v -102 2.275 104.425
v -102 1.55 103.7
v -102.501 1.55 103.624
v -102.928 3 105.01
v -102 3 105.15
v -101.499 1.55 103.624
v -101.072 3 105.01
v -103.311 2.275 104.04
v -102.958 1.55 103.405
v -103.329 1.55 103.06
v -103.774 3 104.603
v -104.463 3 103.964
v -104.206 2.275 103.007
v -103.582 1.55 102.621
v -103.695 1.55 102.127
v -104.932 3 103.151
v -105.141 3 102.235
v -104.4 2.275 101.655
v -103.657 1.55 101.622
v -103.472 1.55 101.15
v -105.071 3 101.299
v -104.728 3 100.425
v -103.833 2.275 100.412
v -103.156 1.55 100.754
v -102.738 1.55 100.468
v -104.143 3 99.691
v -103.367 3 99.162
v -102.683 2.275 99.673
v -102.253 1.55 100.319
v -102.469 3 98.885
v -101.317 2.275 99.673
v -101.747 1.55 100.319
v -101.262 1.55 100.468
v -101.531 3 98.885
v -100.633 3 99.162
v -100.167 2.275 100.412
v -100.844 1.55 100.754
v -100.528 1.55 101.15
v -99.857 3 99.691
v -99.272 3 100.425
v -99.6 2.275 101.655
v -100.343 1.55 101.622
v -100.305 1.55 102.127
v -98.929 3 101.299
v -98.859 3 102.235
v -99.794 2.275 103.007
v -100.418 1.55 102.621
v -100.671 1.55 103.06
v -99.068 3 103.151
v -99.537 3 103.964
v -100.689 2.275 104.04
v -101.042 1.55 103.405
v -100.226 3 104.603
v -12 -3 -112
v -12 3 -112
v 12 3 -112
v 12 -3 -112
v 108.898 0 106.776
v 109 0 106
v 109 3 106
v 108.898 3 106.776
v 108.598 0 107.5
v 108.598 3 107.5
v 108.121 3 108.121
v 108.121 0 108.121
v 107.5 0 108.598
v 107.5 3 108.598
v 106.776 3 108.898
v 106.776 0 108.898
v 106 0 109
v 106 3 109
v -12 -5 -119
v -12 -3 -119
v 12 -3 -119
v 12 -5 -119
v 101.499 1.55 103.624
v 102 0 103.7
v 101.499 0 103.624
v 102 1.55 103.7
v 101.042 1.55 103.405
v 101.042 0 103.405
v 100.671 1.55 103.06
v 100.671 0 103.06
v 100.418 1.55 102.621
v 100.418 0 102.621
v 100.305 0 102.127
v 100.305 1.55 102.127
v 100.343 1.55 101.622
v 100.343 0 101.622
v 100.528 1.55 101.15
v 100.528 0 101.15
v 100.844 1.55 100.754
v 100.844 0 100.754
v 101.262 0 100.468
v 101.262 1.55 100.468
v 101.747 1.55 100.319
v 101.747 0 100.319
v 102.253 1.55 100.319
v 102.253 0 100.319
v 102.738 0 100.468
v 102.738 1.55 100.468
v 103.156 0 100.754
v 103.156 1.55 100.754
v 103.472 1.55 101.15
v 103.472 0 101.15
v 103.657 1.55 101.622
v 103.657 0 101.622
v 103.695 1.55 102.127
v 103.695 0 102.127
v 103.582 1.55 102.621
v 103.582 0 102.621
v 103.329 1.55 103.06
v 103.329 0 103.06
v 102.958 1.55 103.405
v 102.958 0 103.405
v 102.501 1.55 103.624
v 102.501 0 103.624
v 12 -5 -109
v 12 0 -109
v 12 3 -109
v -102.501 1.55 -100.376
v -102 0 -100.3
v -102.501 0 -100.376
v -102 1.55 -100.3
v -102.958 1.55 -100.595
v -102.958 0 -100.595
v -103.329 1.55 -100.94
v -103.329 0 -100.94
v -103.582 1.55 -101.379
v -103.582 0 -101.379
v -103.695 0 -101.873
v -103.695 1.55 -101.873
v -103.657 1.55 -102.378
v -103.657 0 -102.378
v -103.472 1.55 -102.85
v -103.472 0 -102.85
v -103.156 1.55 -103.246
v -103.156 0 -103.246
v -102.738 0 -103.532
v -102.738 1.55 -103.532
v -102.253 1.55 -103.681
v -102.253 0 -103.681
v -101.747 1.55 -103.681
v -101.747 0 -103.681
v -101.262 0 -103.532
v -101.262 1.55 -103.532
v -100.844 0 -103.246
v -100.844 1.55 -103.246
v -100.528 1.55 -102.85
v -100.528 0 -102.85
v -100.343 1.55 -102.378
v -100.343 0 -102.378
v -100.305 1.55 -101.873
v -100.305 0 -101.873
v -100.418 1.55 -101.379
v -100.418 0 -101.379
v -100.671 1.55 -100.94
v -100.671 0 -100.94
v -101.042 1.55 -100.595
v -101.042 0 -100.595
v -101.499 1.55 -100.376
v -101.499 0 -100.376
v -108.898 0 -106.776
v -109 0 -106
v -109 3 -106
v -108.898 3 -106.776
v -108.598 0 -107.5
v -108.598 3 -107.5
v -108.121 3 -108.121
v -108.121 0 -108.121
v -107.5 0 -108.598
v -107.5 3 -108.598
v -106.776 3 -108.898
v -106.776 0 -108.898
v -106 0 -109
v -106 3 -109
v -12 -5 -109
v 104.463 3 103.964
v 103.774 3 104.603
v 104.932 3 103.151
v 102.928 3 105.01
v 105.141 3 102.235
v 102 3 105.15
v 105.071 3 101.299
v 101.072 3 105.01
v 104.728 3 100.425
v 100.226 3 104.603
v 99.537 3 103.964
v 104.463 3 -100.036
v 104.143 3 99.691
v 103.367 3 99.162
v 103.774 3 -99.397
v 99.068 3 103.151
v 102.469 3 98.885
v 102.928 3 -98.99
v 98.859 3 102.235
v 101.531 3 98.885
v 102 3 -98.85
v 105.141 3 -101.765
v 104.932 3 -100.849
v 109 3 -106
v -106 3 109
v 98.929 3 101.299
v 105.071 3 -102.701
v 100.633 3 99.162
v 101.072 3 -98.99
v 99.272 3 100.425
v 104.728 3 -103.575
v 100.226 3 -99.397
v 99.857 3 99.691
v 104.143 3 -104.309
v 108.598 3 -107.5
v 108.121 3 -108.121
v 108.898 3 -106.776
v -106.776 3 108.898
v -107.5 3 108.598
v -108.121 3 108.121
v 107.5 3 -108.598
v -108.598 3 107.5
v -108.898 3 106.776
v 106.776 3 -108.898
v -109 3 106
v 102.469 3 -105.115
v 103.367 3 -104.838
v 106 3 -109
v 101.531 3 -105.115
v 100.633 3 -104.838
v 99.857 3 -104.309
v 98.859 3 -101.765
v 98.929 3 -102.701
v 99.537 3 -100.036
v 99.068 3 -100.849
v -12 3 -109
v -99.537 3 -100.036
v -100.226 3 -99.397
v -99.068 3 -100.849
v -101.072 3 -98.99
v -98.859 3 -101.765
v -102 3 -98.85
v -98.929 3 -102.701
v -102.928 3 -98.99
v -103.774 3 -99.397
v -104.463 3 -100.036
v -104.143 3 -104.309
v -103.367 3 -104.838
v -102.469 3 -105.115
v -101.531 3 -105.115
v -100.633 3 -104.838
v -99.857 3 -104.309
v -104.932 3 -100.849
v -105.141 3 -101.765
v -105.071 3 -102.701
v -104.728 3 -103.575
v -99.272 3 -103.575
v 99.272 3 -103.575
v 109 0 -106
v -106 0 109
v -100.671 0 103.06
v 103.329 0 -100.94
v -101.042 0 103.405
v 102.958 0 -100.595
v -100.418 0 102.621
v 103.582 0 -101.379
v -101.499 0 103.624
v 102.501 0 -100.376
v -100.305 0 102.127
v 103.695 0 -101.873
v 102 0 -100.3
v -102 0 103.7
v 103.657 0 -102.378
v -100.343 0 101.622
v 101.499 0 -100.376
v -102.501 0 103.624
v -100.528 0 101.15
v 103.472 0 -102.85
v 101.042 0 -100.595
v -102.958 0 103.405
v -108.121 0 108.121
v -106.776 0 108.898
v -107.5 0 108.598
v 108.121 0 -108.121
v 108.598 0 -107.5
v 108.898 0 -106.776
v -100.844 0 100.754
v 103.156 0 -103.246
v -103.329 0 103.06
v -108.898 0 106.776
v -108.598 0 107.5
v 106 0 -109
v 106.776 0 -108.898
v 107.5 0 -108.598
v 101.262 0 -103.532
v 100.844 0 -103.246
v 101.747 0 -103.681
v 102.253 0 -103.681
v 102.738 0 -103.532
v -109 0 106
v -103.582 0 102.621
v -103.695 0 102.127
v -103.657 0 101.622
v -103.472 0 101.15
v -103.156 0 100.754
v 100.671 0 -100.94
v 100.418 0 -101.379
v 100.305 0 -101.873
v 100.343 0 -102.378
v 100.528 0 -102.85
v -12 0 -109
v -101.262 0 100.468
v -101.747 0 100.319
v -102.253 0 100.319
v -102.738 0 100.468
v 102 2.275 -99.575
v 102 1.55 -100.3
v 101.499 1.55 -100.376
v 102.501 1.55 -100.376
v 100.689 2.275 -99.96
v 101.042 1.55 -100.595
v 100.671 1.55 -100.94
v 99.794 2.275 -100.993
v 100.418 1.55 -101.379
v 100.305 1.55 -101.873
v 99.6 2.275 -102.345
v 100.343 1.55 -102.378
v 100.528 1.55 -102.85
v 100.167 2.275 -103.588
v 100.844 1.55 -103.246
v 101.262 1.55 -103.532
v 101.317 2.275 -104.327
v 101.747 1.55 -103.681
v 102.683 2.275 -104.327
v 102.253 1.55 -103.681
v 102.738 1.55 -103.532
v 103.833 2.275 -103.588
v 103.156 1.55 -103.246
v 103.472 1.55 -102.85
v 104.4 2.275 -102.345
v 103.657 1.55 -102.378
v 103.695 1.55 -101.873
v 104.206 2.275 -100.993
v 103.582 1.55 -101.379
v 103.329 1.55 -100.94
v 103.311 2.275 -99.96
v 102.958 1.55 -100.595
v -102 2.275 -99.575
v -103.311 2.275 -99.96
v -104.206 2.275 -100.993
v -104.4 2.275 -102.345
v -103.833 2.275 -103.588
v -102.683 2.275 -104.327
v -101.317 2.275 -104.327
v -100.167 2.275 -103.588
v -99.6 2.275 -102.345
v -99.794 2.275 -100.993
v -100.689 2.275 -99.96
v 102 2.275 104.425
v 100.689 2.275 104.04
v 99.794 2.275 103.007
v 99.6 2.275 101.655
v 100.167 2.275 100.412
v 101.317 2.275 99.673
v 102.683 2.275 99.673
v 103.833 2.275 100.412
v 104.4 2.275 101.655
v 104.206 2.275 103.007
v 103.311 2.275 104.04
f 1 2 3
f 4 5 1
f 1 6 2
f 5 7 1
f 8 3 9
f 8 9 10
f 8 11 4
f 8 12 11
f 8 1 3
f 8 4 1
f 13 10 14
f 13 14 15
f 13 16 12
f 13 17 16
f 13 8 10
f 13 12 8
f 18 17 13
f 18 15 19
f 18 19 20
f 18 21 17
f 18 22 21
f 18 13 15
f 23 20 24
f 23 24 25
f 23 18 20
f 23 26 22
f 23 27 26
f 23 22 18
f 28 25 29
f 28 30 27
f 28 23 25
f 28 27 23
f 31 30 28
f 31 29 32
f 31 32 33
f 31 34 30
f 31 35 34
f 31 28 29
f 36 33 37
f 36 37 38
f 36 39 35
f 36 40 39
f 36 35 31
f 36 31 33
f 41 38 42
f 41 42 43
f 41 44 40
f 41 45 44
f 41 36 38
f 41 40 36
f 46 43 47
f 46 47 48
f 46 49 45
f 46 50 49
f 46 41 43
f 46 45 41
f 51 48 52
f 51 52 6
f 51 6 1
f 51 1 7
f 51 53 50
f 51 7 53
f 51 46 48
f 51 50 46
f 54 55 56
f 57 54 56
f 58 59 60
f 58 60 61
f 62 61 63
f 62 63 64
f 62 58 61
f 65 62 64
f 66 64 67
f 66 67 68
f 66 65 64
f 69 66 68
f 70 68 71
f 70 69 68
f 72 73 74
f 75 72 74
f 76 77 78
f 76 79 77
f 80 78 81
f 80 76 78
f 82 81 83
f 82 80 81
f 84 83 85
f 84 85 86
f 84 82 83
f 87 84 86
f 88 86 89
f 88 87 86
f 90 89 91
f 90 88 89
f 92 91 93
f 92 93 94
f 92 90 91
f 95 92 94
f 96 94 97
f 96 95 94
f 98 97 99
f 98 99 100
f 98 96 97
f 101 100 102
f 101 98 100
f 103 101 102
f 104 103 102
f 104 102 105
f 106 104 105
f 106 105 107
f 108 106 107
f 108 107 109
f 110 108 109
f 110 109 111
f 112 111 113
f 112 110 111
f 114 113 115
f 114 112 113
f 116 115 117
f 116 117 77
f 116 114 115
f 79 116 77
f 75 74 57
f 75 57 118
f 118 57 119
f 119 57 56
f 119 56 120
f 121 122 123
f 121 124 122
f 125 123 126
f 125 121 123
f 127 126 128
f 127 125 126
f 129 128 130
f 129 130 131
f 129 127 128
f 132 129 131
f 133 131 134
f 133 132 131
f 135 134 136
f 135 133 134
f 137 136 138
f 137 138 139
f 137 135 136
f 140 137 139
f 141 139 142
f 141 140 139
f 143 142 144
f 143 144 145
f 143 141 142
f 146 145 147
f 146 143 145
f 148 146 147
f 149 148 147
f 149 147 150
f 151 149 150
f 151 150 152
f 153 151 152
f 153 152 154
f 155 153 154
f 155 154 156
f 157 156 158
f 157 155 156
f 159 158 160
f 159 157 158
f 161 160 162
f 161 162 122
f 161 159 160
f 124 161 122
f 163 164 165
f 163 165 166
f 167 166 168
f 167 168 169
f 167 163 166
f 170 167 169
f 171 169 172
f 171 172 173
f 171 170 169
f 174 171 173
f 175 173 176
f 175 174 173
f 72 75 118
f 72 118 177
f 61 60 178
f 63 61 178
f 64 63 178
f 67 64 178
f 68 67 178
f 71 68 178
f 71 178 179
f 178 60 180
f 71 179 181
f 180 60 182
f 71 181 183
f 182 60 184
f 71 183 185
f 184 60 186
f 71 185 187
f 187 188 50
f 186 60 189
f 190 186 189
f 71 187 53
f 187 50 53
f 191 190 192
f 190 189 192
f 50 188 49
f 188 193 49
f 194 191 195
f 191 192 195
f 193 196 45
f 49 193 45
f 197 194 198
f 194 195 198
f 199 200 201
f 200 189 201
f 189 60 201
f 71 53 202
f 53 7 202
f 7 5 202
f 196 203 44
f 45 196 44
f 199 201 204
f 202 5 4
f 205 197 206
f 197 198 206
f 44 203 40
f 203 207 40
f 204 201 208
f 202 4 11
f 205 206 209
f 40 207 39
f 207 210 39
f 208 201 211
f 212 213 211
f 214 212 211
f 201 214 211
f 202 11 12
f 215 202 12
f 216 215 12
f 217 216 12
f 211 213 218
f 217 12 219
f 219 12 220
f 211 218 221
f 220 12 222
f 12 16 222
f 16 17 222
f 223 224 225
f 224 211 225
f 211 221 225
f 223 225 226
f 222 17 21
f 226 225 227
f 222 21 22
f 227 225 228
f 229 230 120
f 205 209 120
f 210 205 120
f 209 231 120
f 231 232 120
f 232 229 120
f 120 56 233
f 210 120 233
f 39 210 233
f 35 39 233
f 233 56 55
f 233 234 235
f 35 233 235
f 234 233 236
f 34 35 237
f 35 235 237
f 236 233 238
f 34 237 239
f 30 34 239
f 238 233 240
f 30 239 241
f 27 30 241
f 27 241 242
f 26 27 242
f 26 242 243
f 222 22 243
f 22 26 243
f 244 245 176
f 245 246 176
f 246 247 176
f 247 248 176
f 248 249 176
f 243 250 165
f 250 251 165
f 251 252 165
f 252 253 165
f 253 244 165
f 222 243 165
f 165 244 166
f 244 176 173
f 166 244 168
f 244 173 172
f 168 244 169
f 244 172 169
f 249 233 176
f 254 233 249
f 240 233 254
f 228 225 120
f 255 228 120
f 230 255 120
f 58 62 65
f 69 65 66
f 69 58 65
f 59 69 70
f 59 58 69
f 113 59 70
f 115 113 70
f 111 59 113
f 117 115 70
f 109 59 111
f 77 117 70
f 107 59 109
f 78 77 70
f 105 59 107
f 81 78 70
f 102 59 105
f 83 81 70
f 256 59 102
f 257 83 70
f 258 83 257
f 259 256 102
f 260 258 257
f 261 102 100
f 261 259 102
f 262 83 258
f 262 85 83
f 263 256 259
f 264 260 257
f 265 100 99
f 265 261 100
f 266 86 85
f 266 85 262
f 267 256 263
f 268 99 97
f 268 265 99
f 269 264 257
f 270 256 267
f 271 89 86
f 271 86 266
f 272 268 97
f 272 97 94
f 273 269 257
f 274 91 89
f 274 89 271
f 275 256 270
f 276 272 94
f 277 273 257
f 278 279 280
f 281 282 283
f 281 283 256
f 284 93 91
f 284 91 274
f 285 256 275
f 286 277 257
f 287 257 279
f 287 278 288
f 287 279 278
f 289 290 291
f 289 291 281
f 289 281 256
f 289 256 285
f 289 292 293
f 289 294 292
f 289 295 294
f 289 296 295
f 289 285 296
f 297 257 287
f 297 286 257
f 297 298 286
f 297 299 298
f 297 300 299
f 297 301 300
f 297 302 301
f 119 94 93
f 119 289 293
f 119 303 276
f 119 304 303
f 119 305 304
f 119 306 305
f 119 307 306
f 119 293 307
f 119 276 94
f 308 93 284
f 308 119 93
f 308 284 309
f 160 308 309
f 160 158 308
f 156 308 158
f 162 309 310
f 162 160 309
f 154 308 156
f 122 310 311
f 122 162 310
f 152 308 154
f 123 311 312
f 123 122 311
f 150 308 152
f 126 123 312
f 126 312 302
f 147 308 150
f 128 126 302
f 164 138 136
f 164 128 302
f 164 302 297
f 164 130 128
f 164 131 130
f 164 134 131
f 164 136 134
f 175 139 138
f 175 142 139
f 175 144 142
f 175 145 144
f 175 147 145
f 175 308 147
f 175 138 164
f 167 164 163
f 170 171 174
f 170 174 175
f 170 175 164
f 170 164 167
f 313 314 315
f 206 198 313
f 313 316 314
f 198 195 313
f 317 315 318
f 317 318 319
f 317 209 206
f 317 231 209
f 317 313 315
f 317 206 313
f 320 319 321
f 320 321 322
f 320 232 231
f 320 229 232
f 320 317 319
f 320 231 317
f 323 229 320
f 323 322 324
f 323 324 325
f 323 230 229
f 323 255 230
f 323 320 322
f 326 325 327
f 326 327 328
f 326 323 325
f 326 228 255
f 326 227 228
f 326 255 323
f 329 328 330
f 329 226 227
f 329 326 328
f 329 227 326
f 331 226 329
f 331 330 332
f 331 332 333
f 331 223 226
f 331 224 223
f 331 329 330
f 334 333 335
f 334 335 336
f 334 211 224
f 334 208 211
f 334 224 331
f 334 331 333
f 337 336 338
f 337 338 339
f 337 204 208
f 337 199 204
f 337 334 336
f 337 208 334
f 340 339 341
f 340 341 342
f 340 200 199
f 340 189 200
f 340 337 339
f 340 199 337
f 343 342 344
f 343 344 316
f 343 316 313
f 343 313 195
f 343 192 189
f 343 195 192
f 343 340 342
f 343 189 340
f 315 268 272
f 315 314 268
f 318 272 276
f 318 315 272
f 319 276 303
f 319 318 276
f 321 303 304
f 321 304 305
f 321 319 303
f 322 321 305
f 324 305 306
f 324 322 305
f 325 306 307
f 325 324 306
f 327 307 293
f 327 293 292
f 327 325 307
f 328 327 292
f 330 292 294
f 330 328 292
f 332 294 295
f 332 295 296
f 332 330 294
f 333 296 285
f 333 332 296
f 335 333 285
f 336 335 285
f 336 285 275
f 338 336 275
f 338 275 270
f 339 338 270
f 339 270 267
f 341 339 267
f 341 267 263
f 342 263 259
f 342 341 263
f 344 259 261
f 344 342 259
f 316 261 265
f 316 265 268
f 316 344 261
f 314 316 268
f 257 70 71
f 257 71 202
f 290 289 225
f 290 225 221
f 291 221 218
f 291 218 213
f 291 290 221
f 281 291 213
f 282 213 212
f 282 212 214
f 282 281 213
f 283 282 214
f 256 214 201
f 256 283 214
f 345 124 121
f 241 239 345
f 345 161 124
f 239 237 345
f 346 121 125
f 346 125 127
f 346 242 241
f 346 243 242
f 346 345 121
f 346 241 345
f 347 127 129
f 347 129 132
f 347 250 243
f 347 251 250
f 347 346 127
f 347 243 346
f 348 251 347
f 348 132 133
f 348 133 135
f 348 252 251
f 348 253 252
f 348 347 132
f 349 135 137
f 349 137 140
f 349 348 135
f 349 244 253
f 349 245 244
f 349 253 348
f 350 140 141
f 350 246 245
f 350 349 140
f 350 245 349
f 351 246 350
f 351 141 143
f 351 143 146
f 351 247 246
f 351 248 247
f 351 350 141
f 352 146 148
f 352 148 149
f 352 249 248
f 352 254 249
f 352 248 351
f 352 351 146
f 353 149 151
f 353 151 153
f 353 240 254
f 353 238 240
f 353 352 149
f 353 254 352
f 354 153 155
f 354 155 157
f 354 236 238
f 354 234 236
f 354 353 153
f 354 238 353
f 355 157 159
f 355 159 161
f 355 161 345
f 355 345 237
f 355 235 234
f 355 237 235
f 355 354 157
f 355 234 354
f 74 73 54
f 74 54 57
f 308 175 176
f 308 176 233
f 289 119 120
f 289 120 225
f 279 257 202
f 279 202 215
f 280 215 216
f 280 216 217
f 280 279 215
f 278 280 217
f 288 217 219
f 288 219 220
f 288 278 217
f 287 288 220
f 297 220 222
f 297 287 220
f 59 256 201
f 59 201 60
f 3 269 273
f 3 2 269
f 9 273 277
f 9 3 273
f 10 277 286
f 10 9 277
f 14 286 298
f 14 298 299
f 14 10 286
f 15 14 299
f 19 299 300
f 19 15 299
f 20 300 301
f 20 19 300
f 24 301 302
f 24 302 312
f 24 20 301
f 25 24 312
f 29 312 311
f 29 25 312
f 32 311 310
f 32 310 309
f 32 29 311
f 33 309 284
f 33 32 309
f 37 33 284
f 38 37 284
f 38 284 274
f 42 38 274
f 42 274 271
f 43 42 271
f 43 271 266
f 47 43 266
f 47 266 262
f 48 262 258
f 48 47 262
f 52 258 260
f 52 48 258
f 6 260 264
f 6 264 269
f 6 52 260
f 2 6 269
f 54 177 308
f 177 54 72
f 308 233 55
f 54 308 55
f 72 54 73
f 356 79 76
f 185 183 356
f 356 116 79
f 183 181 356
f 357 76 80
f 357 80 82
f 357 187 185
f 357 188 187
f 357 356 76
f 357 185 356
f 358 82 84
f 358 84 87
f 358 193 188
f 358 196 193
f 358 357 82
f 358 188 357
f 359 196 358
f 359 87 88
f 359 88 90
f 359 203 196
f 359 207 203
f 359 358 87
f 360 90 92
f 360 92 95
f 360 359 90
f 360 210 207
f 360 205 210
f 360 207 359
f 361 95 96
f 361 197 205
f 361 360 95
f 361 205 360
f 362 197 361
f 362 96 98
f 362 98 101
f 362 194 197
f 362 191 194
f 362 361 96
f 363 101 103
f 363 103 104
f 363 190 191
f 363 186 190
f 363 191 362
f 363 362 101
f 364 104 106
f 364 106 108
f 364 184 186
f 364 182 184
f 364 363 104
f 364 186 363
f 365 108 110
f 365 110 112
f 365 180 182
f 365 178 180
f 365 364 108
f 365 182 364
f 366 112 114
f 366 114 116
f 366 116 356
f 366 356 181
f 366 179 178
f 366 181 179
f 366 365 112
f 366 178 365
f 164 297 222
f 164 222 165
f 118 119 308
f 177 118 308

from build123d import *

# Parameters (mm, degrees)
BOSS_EXTRUDE1_DEPTH                            = 3
CSK_FOR_M3_FLAT_HEAD_MACHINE_SCREW1_AT_2_COUNT = 2
CSK_FOR_M3_FLAT_HEAD_MACHINE_SCREW1_AT_2_PITCH = 204
CSK_FOR_M3_FLAT_HEAD_MACHINE_SCREW1_AT_3_COUNT = 2
CSK_FOR_M3_FLAT_HEAD_MACHINE_SCREW1_AT_3_PITCH = 288.499566724
CSK_FOR_M3_FLAT_HEAD_MACHINE_SCREW1_AT_4_COUNT = 2
CSK_FOR_M3_FLAT_HEAD_MACHINE_SCREW1_AT_4_PITCH = 204
BOSS_EXTRUDE2_START                            = -3
BOSS_EXTRUDE2_DEPTH                            = 8
SKETCH6_W                                      = 24
SKETCH6_H                                      = 7
CUT_EXTRUDE1_DEPTH                             = 6


with BuildPart() as part:
    # Sketch1 → Boss-Extrude1 (new body)
    with BuildSketch(Plane(origin=(0, 0, 0), x_dir=(1, 0, 0), z_dir=(0, 1, 0))):
        with BuildLine():
            Line((-106, 109), (106, 109))
            ThreePointArc((106, 109), (108.121320344, 108.121320344), (109, 106))
            Line((109, 106), (109, -106))
            ThreePointArc((109, -106), (108.121320344, -108.121320344), (106, -109))
            Line((106, -109), (-106, -109))
            ThreePointArc((-106, -109), (-108.121320344, -108.121320344), (-109, -106))
            Line((-109, -106), (-109, 106))
            ThreePointArc((-109, 106), (-108.121320344, 108.121320344), (-106, 109))
        make_face()
    extrude(amount=BOSS_EXTRUDE1_DEPTH)

    # Sketch4 → CSK for M3 Flat Head Machine Screw1 (revolve, cut)
    with BuildSketch(Plane(origin=(-102, 3, -102), x_dir=(0, 0, 1), z_dir=(1, 0, 0))):
        Polygon((0, 0), (0, 3), (1.7, 3), (1.7, 1.45), (3.15, 0), align=None)
    csk_for_m3_flat_head_machine_screw1 = revolve(axis=Axis((-102, 9.35, -102), (0, -1, 0)), mode=Mode.SUBTRACT)

    # CSK for M3 Flat Head Machine Screw1 at 2: CSK for M3 Flat Head Machine Screw1 ×2
    with Locations(*[(0, 0, i * CSK_FOR_M3_FLAT_HEAD_MACHINE_SCREW1_AT_2_PITCH) for i in range(1, CSK_FOR_M3_FLAT_HEAD_MACHINE_SCREW1_AT_2_COUNT)]):
        add(csk_for_m3_flat_head_machine_screw1, mode=Mode.SUBTRACT)

    # CSK for M3 Flat Head Machine Screw1 at 3: CSK for M3 Flat Head Machine Screw1 ×2
    with Locations(*[Vector(0.7071067811865476, 0, 0.7071067811865475) * (i * CSK_FOR_M3_FLAT_HEAD_MACHINE_SCREW1_AT_3_PITCH) for i in range(1, CSK_FOR_M3_FLAT_HEAD_MACHINE_SCREW1_AT_3_COUNT)]):
        add(csk_for_m3_flat_head_machine_screw1, mode=Mode.SUBTRACT)

    # CSK for M3 Flat Head Machine Screw1 at 4: CSK for M3 Flat Head Machine Screw1 ×2
    with Locations(*[(i * CSK_FOR_M3_FLAT_HEAD_MACHINE_SCREW1_AT_4_PITCH, 0, 0) for i in range(1, CSK_FOR_M3_FLAT_HEAD_MACHINE_SCREW1_AT_4_COUNT)]):
        add(csk_for_m3_flat_head_machine_screw1, mode=Mode.SUBTRACT)

    # Sketch5 → Boss-Extrude2 (add)
    with BuildSketch(Plane(origin=(0, 0, 0), x_dir=(-1, 0, 0), z_dir=(0, -1, 0)).offset(BOSS_EXTRUDE2_START)):
        Polygon((0, 109), (12, 109), (12, 119), (-12, 119), (-12, 109), align=None)
    extrude(amount=BOSS_EXTRUDE2_DEPTH)

    # Sketch6 → Cut-Extrude1 (cut)
    with BuildSketch(Plane(origin=(0, 3, 0), x_dir=(1, 0, 0), z_dir=(0, 1, 0))):
        with Locations((0, 115.5)):
            Rectangle(SKETCH6_W, SKETCH6_H)
    extrude(amount=-CUT_EXTRUDE1_DEPTH, mode=Mode.SUBTRACT)


solid = part.part
